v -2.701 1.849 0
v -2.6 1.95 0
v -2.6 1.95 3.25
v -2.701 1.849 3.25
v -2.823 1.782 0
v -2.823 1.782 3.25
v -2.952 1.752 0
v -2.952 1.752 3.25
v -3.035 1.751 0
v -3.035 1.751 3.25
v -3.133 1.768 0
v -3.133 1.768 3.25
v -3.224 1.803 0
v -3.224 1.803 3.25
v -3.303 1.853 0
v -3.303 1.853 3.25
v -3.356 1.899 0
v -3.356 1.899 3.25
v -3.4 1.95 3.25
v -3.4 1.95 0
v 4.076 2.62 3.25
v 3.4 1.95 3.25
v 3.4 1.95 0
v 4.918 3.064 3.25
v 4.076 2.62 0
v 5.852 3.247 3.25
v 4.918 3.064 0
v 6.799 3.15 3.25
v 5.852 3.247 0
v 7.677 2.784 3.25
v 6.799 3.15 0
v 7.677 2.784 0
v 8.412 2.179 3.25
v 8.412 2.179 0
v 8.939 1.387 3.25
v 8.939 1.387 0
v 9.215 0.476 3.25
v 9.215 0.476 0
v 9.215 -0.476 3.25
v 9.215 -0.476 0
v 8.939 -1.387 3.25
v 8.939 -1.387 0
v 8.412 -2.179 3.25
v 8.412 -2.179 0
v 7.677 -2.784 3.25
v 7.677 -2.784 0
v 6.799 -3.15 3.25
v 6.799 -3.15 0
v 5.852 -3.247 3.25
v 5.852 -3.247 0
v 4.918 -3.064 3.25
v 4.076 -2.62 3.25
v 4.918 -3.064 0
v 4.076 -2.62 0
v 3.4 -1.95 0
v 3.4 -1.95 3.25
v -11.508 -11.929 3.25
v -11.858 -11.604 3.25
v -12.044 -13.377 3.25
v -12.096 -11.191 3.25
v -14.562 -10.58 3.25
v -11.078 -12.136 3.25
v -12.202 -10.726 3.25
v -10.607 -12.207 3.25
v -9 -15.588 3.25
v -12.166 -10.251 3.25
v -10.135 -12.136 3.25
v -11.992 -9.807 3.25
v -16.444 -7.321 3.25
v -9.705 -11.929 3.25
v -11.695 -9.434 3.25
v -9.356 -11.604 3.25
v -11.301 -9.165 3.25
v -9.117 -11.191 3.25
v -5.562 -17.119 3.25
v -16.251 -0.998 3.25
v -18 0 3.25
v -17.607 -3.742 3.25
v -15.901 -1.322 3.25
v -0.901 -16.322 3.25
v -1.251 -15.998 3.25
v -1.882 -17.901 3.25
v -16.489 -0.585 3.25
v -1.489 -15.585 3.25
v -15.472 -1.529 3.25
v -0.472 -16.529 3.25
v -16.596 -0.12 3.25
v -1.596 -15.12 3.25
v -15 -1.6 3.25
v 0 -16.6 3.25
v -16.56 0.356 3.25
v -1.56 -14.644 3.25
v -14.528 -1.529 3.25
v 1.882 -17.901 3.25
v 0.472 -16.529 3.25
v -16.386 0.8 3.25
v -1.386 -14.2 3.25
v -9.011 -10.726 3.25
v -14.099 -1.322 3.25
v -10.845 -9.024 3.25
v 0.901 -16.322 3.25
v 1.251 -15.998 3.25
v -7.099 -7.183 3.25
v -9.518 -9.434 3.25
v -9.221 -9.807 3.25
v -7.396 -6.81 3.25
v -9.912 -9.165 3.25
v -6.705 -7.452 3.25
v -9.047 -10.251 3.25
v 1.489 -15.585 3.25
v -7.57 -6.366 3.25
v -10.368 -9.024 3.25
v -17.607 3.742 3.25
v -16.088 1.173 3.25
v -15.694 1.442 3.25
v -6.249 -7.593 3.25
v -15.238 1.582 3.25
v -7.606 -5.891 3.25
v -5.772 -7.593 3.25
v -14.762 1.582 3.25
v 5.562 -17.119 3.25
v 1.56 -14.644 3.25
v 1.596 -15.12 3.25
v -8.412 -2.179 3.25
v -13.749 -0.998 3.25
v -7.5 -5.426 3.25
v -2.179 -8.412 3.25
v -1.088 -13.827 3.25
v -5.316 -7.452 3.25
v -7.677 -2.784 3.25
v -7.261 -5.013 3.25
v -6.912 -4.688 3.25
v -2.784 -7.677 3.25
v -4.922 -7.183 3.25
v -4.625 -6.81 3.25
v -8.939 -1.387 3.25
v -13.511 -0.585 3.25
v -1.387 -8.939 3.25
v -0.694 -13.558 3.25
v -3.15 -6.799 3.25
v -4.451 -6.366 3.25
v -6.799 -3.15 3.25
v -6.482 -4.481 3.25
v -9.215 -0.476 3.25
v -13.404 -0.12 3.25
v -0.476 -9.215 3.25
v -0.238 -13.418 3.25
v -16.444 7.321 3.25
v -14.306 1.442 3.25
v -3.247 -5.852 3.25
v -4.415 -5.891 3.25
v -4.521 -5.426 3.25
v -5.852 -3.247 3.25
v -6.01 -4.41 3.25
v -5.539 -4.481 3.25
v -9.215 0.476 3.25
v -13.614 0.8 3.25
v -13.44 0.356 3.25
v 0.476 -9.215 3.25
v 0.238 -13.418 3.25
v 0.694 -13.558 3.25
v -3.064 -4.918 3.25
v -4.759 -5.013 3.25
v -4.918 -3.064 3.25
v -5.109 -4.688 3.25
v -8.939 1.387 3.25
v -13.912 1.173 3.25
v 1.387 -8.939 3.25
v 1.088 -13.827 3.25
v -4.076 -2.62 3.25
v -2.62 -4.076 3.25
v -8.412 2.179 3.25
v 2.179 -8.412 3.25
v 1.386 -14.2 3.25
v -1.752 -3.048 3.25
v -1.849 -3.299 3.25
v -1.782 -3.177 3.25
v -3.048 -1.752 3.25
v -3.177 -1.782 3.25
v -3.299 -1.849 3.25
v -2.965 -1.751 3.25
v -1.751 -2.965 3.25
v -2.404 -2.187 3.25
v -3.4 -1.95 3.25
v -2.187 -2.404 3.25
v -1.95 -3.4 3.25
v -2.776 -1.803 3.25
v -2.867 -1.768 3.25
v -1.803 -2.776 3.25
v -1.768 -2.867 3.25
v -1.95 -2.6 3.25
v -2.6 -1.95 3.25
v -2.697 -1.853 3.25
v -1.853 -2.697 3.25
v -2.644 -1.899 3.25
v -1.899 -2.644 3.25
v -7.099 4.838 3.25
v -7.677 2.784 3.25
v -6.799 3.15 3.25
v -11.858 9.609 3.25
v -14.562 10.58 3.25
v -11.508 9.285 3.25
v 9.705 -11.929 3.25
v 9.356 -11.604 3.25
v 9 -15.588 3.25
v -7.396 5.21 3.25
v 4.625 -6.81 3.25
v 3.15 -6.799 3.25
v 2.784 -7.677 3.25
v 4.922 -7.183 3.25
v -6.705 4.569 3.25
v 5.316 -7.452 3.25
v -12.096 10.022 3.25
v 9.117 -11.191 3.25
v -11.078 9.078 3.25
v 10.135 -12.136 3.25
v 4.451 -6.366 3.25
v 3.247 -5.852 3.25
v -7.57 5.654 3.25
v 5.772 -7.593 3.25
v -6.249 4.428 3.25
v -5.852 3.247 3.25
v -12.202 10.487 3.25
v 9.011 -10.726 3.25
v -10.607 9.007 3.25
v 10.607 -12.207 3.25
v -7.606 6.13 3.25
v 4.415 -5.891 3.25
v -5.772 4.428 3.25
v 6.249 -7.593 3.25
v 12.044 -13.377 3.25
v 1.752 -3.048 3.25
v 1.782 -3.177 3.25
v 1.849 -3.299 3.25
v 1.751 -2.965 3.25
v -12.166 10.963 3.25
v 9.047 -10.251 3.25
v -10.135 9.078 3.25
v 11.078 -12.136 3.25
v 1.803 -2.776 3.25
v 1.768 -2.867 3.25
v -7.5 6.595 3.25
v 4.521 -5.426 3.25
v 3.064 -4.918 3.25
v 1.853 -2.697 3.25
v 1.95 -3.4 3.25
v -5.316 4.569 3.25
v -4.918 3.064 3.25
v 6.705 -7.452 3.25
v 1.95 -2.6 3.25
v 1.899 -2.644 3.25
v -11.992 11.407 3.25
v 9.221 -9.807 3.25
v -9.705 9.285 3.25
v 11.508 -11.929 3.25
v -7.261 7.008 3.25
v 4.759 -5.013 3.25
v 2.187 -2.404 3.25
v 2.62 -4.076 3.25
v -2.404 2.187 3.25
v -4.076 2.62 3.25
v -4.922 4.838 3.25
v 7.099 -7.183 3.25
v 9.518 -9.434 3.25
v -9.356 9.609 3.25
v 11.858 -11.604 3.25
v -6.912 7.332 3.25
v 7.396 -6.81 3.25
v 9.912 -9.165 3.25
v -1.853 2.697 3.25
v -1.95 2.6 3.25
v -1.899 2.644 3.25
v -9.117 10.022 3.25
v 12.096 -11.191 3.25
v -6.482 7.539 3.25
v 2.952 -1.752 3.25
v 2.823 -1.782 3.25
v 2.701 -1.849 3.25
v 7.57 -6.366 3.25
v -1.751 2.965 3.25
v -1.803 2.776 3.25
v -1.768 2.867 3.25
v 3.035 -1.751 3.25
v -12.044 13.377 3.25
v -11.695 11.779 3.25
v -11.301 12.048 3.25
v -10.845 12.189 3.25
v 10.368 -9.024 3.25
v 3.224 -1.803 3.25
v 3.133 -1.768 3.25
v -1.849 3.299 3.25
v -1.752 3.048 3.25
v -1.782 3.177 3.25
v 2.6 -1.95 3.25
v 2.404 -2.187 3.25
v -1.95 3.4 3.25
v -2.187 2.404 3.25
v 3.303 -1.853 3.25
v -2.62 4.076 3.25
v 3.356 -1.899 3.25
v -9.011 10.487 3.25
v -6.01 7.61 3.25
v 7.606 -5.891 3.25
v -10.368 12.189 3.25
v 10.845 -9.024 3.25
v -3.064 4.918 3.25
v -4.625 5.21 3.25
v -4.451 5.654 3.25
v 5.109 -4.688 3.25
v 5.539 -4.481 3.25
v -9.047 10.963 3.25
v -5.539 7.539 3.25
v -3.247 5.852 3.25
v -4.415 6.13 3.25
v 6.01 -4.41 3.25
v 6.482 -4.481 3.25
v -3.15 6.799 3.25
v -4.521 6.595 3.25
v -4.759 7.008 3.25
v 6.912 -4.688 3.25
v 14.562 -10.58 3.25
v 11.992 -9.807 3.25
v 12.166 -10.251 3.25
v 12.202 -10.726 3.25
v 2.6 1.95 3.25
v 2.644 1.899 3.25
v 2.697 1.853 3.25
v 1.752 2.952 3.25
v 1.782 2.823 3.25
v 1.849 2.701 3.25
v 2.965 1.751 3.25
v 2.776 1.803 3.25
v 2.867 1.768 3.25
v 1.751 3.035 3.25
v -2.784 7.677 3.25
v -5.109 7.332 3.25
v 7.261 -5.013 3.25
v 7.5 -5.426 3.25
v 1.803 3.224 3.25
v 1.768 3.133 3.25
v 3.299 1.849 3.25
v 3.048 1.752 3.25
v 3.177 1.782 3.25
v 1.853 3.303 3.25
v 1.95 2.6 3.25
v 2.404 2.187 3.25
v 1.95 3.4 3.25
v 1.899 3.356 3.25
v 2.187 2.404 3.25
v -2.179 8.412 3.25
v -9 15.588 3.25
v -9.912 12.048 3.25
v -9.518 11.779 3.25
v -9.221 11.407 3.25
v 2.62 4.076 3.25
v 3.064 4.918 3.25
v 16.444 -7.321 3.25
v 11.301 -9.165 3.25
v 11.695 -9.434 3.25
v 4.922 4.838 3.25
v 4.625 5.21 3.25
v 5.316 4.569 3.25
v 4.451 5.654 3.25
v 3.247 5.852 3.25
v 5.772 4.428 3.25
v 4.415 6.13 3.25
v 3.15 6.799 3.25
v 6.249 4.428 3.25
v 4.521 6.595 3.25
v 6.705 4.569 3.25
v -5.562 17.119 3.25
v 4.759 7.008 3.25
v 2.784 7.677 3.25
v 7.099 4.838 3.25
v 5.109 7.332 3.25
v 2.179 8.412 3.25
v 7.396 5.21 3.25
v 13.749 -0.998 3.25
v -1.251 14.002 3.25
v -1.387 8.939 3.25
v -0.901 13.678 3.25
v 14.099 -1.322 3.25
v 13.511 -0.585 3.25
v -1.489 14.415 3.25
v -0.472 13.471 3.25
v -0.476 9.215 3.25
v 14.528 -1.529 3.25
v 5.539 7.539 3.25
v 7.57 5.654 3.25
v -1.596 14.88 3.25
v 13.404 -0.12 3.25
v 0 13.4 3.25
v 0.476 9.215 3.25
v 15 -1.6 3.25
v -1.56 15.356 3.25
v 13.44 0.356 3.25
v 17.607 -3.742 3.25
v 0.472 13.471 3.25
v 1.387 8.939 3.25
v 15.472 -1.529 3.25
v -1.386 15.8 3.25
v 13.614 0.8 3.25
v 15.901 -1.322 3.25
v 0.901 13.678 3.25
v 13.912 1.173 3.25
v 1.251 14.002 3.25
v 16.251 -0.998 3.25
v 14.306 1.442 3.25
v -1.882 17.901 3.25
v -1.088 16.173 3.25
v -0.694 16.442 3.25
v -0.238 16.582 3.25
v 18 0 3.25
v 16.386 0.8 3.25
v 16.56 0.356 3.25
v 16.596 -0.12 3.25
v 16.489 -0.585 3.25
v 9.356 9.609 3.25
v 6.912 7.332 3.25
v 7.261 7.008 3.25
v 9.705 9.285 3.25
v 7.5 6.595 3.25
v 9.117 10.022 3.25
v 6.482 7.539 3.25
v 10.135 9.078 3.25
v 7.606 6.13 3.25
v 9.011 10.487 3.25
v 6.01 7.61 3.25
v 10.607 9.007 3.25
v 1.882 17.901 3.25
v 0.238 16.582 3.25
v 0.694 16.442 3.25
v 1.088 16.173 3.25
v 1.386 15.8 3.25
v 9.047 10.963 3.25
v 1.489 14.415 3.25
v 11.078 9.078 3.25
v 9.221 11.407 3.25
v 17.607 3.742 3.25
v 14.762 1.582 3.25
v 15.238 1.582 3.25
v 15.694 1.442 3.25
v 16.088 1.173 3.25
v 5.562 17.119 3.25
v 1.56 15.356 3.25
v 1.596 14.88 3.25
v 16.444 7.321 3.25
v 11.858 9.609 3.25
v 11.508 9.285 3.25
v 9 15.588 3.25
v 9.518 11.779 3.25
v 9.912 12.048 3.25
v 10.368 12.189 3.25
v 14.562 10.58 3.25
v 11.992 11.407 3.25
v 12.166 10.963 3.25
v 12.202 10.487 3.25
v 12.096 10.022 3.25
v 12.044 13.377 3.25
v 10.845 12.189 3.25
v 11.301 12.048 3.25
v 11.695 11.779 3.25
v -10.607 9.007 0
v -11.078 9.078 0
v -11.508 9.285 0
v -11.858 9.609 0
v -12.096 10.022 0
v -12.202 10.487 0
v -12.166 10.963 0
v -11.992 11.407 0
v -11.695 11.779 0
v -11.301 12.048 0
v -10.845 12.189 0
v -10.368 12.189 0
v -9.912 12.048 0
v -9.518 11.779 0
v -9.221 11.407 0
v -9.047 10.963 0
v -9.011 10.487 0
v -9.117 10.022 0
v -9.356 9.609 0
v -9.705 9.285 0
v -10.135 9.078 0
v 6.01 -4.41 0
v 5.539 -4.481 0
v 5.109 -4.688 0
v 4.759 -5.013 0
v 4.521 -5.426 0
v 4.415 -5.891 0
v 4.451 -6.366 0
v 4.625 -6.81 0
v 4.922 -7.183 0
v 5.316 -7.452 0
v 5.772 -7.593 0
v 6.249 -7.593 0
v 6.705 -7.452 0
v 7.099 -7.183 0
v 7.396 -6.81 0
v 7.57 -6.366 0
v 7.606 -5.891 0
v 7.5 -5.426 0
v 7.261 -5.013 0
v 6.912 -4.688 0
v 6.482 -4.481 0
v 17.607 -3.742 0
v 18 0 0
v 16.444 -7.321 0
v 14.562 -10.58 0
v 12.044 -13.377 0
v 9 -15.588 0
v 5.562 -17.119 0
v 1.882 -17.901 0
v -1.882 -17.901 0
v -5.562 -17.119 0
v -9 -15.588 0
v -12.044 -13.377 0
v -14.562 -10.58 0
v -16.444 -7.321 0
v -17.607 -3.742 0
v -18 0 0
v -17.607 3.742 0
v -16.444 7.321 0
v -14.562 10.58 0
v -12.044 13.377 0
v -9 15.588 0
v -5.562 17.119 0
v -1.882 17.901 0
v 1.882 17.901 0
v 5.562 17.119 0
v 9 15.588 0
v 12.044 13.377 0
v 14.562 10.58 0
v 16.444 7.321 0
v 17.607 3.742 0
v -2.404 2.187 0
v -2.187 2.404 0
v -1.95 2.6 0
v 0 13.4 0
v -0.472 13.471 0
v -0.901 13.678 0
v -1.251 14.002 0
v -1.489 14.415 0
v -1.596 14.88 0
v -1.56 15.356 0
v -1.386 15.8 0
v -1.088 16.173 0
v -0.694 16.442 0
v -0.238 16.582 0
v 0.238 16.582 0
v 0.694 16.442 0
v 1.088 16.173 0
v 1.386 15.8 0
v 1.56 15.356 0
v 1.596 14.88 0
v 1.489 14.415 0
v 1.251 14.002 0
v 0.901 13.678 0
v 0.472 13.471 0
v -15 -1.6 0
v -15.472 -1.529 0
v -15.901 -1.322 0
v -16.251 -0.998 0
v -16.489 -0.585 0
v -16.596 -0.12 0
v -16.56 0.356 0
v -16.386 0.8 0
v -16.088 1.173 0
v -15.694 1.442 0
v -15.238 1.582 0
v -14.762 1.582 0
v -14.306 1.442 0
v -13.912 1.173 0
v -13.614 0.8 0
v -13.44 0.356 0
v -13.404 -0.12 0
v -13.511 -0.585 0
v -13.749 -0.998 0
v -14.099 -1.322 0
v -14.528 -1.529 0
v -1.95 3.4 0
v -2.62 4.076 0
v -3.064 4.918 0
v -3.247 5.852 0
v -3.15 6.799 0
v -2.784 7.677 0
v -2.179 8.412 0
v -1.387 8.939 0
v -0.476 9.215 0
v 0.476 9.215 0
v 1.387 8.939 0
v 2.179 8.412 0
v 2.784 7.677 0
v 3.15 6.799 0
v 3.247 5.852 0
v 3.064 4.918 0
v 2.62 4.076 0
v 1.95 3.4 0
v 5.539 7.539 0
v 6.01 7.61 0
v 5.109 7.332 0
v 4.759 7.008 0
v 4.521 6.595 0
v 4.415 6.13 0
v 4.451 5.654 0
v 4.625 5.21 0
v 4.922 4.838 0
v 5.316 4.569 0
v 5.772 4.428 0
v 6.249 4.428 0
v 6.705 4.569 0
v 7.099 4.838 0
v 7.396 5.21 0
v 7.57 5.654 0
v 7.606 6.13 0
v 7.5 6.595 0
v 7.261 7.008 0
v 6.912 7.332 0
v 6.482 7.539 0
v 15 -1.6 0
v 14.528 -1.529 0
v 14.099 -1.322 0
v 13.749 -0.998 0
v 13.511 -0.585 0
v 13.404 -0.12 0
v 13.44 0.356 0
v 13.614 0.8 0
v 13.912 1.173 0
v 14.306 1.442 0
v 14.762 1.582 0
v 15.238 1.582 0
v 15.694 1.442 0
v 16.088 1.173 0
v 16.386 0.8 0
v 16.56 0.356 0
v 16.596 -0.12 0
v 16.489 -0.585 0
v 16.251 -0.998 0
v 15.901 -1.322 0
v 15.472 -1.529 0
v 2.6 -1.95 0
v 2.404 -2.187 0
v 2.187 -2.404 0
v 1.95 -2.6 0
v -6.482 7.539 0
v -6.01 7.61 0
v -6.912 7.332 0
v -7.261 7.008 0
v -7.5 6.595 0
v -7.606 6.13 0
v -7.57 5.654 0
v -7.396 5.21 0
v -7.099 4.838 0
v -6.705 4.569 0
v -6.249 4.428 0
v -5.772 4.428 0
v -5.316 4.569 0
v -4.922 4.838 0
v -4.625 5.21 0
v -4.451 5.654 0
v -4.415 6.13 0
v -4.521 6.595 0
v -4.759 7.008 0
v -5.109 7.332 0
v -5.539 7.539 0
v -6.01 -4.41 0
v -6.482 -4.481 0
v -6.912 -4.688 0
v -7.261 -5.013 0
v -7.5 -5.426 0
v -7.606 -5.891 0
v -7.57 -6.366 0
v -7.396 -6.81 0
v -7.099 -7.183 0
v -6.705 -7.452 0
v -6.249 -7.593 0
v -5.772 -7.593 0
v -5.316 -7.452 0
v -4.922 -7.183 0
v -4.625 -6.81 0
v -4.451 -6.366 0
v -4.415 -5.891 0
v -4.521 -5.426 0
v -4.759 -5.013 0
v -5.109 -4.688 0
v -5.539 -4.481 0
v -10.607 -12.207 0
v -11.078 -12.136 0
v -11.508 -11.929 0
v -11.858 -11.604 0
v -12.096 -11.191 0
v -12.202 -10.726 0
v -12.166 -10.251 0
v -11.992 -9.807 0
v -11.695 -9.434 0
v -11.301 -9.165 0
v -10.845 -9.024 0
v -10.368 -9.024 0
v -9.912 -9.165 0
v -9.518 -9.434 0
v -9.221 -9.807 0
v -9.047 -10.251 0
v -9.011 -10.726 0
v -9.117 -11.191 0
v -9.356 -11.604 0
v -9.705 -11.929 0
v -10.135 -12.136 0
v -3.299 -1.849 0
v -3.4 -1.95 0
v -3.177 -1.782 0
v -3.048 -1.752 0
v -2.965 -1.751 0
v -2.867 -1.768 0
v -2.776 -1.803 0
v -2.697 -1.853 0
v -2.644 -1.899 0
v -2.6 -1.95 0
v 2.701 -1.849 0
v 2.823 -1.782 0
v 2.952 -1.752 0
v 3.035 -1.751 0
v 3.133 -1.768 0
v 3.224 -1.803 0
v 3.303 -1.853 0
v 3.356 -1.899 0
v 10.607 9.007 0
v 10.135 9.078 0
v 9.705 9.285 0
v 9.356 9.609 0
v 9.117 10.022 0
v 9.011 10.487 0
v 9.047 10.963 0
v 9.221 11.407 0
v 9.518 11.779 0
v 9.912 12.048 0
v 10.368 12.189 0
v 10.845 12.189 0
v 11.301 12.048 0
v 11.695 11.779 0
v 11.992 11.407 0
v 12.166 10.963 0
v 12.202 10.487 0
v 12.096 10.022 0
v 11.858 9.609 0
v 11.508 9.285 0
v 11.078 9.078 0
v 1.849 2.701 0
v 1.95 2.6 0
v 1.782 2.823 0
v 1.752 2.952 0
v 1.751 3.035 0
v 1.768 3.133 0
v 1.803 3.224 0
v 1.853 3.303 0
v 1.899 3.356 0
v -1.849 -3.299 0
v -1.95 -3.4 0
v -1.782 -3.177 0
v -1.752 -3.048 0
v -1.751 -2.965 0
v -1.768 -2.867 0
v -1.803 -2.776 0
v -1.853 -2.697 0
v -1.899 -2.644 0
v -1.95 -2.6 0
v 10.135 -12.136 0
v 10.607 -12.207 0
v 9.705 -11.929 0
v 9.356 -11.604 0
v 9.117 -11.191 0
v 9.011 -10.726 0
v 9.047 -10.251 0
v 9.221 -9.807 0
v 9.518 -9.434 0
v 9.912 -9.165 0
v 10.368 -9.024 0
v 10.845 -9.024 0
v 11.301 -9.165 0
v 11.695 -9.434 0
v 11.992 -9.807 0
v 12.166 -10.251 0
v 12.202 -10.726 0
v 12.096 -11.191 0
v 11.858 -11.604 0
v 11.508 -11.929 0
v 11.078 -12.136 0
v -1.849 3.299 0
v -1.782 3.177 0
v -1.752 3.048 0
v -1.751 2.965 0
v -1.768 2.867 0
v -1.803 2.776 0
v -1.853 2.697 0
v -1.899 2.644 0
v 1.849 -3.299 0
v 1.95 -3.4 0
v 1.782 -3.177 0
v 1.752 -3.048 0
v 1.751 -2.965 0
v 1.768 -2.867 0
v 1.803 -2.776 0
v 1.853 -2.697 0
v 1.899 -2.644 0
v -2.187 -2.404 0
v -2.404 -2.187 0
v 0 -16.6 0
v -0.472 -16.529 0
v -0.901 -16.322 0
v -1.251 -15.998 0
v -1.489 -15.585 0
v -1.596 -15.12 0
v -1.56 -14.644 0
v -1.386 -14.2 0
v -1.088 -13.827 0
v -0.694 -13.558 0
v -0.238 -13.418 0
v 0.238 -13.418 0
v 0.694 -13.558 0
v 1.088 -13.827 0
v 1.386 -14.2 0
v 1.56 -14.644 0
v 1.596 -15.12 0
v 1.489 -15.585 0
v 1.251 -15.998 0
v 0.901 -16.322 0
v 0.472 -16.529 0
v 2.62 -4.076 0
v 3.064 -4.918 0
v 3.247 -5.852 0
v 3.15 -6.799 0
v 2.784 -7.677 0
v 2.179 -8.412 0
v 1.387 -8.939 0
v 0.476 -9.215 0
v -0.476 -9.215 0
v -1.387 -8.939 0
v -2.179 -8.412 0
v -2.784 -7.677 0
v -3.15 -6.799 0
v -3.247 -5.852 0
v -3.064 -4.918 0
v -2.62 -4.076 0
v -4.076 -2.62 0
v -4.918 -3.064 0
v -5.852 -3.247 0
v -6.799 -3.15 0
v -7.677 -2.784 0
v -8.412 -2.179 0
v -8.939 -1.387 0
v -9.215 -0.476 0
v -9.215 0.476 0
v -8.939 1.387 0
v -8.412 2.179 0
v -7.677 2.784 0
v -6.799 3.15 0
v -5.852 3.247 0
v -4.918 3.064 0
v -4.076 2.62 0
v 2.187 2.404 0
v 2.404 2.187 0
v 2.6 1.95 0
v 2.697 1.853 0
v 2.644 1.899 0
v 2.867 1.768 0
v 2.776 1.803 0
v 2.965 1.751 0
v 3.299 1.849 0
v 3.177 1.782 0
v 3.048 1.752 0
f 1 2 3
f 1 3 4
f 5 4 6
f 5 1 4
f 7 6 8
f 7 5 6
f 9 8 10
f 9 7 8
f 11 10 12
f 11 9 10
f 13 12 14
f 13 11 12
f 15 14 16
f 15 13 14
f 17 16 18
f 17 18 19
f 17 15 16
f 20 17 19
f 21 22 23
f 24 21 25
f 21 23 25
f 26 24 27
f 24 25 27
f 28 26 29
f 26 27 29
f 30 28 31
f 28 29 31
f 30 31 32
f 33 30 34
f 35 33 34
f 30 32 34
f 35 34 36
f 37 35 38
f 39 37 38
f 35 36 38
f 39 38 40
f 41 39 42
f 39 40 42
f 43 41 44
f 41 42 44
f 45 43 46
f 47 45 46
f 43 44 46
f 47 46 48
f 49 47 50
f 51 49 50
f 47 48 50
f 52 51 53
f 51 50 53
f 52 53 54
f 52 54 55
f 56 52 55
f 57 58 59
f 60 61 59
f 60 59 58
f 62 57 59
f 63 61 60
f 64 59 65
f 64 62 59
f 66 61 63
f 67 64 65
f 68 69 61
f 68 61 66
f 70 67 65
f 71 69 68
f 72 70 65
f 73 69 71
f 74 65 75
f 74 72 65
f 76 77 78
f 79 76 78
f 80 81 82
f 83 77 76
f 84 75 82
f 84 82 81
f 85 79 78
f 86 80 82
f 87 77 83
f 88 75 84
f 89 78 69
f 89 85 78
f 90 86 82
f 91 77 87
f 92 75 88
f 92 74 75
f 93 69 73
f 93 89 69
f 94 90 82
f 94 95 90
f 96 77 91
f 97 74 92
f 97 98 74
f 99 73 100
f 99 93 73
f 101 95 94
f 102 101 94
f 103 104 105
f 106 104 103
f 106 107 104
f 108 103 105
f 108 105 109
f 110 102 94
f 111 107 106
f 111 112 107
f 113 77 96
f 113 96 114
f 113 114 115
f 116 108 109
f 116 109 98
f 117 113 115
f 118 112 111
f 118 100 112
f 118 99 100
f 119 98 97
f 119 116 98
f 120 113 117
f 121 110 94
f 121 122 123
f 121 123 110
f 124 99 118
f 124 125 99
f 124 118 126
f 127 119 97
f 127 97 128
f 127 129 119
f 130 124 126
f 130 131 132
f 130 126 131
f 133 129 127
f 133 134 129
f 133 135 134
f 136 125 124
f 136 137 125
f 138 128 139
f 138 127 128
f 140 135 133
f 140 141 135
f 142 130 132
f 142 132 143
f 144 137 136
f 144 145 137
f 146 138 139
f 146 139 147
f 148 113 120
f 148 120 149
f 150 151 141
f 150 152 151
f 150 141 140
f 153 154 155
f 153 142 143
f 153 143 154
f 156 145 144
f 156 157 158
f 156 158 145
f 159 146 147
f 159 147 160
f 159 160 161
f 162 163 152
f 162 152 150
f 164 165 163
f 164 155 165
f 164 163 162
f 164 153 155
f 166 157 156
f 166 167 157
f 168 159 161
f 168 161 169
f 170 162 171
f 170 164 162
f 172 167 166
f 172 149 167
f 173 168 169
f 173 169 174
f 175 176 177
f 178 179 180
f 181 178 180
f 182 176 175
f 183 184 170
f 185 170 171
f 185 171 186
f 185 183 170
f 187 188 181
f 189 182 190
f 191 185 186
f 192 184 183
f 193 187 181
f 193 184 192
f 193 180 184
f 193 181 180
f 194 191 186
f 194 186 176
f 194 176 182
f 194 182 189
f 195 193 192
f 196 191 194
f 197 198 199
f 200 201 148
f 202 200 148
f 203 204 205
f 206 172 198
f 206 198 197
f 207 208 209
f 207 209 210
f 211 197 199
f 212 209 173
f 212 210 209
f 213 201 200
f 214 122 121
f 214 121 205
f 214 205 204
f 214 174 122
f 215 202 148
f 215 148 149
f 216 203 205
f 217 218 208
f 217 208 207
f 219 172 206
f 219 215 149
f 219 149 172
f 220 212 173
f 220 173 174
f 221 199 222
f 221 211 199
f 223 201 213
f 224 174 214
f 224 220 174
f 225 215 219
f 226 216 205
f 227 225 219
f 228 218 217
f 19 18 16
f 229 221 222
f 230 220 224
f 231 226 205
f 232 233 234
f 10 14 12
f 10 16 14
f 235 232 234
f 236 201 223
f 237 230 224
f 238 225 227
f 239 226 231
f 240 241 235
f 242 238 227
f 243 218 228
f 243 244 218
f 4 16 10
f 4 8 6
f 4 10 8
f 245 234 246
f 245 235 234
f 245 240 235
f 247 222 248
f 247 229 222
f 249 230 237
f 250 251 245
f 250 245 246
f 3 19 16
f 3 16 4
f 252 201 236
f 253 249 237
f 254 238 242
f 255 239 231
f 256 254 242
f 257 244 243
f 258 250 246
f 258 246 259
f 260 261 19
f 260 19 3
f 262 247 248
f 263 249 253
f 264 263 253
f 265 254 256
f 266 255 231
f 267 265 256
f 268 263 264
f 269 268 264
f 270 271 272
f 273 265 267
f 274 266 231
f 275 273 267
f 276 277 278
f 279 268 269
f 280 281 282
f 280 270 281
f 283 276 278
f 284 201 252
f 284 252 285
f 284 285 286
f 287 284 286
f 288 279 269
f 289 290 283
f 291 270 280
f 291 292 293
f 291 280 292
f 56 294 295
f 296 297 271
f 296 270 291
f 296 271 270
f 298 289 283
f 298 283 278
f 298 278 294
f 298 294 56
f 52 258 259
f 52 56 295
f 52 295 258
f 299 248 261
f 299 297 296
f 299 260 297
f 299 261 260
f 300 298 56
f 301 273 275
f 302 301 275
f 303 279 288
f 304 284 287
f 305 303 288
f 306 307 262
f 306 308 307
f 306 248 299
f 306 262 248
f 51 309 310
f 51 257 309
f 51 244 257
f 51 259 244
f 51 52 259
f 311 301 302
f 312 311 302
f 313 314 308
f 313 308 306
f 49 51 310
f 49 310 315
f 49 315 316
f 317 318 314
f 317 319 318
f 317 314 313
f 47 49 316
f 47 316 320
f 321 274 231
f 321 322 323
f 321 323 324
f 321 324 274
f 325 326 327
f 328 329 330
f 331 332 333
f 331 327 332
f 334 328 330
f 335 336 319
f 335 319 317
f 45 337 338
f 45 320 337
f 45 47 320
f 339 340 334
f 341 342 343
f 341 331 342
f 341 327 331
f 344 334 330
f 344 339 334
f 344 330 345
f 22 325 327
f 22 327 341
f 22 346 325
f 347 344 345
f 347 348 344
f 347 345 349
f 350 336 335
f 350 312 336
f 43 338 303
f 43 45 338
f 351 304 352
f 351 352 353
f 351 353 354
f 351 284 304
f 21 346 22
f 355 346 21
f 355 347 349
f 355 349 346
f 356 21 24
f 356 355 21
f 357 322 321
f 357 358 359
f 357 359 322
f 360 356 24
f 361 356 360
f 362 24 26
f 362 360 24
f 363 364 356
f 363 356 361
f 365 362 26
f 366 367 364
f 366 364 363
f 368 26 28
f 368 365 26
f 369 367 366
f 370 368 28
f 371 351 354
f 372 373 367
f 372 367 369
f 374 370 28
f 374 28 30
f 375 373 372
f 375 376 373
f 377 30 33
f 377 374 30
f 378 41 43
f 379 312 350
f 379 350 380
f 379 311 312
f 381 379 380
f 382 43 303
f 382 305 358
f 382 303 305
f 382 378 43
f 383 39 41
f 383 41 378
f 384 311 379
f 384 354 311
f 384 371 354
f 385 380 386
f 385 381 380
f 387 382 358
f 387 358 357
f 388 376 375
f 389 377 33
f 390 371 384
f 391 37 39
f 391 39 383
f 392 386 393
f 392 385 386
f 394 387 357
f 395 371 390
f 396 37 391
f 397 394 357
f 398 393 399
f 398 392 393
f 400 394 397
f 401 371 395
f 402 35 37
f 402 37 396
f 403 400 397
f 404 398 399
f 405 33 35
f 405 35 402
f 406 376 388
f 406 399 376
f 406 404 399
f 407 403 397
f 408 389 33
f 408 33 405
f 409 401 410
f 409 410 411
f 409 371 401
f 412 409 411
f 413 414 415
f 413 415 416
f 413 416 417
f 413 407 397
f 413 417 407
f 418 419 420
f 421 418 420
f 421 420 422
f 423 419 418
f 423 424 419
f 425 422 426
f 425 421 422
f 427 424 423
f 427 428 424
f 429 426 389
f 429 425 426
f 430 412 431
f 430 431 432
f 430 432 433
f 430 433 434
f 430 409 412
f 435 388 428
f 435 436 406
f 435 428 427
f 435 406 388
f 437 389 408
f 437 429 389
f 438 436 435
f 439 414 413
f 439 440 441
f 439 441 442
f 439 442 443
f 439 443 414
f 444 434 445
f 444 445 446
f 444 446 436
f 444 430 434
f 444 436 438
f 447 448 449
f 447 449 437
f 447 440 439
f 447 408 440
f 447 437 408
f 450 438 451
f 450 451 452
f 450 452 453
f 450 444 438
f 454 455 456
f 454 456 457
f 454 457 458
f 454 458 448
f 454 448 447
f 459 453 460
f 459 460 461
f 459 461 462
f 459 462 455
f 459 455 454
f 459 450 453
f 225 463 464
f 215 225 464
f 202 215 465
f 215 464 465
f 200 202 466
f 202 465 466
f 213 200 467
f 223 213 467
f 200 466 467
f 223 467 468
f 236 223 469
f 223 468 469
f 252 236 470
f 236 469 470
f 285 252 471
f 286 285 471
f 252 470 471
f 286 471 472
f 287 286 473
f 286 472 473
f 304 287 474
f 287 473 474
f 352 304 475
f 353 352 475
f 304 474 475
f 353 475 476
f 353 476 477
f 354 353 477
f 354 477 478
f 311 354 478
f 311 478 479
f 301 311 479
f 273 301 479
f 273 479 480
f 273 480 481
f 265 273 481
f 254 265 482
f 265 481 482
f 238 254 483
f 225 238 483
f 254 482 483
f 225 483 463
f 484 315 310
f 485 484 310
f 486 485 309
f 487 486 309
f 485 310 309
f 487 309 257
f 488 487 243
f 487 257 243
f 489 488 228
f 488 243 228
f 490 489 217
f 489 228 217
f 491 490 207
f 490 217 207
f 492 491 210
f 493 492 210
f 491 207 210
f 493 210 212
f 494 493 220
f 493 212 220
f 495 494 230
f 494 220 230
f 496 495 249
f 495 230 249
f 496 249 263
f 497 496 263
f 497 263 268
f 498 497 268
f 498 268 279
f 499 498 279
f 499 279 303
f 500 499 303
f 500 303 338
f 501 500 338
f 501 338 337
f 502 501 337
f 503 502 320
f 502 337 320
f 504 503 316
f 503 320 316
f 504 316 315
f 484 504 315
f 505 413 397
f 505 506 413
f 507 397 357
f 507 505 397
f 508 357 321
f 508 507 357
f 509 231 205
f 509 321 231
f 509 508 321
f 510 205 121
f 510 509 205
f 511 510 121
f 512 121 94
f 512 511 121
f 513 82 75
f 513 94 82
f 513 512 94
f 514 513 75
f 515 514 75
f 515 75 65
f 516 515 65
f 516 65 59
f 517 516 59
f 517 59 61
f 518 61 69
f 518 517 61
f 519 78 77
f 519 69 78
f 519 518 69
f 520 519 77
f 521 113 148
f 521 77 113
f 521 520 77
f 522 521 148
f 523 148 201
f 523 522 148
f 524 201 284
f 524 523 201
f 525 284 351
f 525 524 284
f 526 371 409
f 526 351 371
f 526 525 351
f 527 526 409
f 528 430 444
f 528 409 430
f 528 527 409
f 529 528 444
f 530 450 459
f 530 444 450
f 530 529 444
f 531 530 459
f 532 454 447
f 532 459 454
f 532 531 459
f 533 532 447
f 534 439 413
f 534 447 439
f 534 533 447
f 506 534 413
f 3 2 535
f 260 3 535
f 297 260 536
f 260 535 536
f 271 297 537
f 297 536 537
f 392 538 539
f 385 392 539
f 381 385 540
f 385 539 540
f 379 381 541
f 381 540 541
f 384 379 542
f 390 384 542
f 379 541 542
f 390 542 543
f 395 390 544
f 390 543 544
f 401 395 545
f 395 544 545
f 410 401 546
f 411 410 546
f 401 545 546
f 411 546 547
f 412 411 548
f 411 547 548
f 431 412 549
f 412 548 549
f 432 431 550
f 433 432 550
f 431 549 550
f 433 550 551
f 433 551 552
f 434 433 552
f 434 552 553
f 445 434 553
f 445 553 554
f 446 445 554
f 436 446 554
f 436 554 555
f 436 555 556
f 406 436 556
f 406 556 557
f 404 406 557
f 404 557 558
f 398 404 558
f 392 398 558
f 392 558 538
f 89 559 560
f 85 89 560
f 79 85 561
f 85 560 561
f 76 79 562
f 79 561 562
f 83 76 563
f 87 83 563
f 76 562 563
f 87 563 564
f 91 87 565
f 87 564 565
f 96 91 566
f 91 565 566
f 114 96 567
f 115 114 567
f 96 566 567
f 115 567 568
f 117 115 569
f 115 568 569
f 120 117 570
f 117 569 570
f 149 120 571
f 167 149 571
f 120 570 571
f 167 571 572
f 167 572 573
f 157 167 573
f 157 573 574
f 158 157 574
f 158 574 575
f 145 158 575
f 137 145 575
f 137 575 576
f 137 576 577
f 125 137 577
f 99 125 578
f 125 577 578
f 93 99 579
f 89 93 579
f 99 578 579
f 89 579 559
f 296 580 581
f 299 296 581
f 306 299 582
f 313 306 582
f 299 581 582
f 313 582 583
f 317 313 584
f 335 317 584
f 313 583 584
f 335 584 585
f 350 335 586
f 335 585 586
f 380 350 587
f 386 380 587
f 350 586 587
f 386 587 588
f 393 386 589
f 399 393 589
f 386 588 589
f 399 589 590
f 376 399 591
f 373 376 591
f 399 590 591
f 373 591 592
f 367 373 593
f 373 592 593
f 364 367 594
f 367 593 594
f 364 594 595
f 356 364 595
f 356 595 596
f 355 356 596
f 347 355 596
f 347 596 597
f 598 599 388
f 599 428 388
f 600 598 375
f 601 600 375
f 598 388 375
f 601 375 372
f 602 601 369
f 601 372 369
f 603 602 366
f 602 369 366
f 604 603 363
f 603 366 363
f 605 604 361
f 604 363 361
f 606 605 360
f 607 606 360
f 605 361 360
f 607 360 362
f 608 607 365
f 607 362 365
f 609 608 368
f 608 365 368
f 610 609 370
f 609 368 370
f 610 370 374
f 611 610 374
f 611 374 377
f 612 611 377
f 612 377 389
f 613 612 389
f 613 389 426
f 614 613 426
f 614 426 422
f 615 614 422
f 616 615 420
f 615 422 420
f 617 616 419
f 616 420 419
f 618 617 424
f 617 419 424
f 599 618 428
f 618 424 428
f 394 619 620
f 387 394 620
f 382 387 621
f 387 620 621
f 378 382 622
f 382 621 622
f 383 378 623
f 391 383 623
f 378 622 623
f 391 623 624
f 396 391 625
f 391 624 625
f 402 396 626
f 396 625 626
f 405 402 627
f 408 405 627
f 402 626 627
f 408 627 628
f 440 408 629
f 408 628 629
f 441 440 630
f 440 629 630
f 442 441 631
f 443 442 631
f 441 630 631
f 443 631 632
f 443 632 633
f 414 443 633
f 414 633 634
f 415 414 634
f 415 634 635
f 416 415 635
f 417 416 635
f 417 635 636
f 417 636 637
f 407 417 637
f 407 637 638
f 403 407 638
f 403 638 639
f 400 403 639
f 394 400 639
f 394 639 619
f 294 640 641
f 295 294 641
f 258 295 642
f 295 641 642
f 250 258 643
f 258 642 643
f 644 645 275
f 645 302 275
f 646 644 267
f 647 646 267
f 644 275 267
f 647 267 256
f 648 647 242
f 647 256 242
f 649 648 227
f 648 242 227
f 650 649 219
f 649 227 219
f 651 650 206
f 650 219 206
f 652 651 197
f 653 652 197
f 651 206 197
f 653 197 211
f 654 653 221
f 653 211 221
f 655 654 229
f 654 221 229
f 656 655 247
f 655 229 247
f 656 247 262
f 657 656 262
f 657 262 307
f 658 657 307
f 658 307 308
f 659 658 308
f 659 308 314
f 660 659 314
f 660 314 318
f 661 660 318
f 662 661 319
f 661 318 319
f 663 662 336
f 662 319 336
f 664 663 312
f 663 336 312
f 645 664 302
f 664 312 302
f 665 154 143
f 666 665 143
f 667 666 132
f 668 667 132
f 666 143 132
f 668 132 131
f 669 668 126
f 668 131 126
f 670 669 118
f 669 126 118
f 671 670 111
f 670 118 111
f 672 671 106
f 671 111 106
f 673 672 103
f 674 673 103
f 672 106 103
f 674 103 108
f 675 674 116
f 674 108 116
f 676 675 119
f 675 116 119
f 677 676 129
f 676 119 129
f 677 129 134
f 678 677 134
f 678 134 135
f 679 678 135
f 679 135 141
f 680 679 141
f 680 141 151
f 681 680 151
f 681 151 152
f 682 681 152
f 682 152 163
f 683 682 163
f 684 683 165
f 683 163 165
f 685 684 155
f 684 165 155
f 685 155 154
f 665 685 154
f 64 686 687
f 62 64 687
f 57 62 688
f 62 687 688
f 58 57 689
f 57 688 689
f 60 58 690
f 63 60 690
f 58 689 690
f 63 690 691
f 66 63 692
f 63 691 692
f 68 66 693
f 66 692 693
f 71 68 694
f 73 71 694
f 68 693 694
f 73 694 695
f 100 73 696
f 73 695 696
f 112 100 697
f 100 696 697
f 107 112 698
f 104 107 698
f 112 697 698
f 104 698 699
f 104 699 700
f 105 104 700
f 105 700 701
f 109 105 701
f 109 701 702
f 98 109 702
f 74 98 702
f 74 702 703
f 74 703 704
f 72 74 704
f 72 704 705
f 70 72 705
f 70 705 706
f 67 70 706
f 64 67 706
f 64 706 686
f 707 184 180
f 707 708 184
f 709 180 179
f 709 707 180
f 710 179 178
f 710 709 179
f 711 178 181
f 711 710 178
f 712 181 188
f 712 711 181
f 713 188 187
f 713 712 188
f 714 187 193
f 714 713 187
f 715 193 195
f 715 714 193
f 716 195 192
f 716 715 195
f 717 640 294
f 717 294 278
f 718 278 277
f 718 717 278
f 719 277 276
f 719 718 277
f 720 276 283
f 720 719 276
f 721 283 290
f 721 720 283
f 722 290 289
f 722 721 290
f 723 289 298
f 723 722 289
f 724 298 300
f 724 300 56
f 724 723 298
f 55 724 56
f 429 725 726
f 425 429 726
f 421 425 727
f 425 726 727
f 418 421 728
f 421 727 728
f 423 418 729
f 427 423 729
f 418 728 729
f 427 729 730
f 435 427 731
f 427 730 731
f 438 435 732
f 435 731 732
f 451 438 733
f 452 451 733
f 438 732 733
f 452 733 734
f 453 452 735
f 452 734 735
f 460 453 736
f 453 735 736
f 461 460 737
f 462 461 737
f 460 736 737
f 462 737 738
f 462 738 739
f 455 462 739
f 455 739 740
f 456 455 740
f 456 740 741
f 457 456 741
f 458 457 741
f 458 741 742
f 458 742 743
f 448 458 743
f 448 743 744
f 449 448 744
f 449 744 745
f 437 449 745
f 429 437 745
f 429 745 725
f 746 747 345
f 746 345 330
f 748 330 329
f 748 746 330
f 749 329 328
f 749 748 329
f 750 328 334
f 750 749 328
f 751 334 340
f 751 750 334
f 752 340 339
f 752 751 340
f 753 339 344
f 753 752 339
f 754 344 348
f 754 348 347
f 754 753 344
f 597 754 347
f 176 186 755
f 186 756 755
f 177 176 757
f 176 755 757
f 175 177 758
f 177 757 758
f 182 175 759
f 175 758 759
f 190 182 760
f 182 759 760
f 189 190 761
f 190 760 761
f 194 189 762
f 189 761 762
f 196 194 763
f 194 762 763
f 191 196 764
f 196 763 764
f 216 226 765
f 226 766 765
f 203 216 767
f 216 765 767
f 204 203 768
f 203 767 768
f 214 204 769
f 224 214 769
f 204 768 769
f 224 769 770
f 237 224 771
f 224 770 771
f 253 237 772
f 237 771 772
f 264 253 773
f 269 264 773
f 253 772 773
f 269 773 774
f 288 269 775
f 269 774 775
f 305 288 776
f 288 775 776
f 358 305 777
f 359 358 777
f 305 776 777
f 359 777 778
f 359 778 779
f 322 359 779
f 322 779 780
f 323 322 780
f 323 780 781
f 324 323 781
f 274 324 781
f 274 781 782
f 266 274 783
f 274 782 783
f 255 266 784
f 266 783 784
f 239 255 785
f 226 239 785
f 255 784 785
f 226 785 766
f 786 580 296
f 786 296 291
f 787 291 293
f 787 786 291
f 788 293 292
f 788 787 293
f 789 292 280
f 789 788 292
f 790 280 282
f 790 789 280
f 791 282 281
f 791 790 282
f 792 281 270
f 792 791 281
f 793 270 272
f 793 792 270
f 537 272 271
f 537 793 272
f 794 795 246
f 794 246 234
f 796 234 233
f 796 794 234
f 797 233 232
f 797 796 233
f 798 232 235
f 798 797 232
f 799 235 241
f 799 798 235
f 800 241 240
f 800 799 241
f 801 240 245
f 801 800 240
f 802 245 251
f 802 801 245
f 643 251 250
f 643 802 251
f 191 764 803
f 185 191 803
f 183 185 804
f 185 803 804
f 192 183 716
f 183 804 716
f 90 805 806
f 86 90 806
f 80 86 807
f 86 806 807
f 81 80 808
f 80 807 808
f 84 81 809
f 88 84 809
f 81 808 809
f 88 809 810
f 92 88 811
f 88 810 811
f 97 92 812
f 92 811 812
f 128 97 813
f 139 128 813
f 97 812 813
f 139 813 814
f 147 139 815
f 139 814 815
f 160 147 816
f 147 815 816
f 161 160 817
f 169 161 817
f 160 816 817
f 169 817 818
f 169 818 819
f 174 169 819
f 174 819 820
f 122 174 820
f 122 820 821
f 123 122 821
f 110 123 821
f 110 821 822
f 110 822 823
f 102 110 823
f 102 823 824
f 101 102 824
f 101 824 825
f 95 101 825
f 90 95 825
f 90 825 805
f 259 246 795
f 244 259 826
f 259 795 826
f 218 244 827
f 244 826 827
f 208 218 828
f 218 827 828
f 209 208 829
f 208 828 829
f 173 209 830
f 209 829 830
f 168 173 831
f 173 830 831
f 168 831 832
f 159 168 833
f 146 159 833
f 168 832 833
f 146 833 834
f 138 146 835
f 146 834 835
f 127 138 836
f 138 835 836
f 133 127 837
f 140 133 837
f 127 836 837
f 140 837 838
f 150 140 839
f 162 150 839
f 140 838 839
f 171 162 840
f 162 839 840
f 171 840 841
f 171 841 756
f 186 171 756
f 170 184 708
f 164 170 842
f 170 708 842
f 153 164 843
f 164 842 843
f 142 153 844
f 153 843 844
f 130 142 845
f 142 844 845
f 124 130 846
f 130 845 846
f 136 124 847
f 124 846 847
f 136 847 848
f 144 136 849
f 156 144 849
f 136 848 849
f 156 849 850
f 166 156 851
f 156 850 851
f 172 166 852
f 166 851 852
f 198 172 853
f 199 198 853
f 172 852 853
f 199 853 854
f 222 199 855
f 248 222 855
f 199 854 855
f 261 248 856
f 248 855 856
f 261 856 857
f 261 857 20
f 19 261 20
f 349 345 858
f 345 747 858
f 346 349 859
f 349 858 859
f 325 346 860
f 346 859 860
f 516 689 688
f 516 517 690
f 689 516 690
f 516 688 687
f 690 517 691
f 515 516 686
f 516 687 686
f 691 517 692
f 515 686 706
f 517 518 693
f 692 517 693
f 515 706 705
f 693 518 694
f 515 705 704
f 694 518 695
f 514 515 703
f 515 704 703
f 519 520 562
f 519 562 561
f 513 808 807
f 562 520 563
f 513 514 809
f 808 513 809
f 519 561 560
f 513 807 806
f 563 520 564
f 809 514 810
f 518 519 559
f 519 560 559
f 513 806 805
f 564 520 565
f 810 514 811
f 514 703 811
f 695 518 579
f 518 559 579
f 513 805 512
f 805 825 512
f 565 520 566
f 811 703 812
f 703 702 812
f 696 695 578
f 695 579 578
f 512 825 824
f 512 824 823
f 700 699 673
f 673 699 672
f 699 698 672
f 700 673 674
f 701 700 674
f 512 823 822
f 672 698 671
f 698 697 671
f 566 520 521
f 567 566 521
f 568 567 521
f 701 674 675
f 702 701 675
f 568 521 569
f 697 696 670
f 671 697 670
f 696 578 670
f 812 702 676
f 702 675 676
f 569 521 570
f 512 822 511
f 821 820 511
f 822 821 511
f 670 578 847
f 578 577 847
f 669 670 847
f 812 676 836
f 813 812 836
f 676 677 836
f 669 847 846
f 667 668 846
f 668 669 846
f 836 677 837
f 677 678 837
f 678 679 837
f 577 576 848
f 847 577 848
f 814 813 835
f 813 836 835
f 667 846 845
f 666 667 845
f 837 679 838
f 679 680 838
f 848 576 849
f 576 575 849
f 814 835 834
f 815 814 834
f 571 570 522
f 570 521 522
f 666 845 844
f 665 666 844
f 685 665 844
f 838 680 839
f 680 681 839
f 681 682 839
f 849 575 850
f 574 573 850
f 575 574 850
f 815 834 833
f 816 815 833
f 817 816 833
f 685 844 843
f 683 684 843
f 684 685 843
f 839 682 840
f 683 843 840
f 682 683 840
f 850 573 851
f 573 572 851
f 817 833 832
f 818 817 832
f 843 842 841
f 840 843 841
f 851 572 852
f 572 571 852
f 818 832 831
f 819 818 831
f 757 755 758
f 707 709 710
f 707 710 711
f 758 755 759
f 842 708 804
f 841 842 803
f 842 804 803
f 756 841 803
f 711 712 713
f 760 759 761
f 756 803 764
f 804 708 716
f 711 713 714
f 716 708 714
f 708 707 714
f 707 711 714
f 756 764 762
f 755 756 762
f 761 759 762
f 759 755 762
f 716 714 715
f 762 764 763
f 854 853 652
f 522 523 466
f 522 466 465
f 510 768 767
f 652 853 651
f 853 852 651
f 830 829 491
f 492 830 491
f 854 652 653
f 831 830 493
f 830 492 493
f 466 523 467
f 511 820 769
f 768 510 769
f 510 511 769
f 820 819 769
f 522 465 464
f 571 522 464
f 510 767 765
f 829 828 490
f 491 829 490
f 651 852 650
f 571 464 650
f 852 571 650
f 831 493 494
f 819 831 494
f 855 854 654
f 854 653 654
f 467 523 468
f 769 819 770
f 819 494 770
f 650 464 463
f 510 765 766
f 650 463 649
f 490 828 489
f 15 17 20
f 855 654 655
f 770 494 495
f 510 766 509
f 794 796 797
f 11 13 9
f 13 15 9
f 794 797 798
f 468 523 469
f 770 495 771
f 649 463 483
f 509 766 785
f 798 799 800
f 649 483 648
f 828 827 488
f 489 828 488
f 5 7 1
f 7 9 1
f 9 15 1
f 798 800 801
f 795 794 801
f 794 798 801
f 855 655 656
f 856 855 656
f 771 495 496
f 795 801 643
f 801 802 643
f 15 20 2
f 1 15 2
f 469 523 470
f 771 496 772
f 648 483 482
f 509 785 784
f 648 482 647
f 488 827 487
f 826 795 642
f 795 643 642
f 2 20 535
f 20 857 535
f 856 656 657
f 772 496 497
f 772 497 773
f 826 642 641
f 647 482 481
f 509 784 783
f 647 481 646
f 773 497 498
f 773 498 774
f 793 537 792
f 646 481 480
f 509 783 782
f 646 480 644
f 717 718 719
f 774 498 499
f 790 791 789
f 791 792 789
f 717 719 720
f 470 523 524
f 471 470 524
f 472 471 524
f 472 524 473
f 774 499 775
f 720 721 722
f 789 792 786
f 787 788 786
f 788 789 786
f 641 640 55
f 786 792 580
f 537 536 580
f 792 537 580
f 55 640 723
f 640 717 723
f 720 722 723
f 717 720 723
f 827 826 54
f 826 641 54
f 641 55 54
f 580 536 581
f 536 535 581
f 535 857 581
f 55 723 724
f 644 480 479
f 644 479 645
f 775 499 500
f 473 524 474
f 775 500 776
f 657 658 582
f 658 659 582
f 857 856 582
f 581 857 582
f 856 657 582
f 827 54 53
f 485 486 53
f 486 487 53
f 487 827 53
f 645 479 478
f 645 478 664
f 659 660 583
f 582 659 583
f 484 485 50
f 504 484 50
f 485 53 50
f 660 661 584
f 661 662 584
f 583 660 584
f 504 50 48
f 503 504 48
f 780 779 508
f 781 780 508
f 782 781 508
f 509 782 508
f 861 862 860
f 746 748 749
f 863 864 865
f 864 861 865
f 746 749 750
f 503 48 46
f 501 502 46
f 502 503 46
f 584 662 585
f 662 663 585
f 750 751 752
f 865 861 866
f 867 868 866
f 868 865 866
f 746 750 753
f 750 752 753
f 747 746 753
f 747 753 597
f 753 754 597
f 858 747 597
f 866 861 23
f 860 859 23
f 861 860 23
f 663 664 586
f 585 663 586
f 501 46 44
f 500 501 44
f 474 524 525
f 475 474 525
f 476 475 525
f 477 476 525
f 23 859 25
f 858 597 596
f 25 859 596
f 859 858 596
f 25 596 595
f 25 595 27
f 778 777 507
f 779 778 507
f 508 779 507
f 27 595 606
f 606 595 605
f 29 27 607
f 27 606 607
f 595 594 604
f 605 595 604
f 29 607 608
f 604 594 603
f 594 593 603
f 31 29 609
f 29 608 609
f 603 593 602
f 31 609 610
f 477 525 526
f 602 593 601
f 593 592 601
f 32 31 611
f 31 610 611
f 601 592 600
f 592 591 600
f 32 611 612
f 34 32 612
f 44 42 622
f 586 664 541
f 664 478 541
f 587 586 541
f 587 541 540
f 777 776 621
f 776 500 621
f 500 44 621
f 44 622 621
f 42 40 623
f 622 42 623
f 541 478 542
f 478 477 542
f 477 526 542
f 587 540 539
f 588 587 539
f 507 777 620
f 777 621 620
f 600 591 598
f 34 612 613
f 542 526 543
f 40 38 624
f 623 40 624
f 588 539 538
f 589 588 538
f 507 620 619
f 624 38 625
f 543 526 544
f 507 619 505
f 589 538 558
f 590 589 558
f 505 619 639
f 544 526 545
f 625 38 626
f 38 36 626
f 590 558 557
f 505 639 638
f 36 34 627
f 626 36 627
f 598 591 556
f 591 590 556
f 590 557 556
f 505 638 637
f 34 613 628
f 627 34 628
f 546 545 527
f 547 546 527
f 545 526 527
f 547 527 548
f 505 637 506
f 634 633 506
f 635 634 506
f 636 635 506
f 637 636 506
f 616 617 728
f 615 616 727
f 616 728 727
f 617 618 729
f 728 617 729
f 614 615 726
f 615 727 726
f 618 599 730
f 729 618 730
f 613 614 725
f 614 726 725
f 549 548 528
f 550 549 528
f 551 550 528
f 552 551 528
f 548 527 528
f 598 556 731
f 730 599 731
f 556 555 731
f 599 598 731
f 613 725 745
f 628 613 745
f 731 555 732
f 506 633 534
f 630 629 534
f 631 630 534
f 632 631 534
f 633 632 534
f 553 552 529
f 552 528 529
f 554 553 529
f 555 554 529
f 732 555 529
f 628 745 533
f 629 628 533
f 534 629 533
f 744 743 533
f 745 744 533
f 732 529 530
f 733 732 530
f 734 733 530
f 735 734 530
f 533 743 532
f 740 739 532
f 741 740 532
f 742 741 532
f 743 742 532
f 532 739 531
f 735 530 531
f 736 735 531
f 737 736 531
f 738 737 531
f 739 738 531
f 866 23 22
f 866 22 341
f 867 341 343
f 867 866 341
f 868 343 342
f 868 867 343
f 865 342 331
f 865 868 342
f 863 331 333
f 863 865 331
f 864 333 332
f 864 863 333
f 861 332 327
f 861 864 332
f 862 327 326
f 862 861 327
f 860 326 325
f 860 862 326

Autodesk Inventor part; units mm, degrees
ref_plane "YZ Plane" through (0, 0, 0) normal (1, 0, 0) x (0, 1, 0)
ref_plane "XZ Plane" through (0, 0, 0) normal (0, 1, 0) x (-1, 0, 0)
ref_plane "XY Plane" through (0, 0, 0) normal (0, 0, 1) x (1, 0, 0)
sketch "スケッチ1" plane through (0, 0, 0) normal (0, 0, 1) x (1, 0, 0)
  circle A0 centre (0, 0) radius 18
  dimension "d0" = 36
extrude "押し出し1" add sketch "スケッチ1" along normal blind 3.25
sketch "スケッチ2" plane through (0, 0, 3.25) normal (0, 0, 1) x (1, 0, 0)
  circle A0 centre (0, 0) radius 6
  point P0 (0, 6)
  point P1 (-6, 0)
  point P2 (0, -6)
  point P3 (6, 0)
  dimension "d3" = 12
  dimension "d6" = 360
hole "穴1" at (0, 6, 3.25) at (-6, 0, 3.25) at (0, -6, 3.25) at (6, 0, 3.25) direction (0, 0, -1) diameter 3.2 end through all counterbore diameter 6.5 counterbore depth 4 clearance for "Socket Head Cap Screw" size "M3" standard "Ansi Metric M Profile"
sketch "スケッチ3" plane through (0, 0, 0) normal (0, 0, -1) x (-1, 0, 0)
  circle A0 centre (0, 0) radius 8.5
  point P0 (-6.0104, 6.0104)
  point P1 (-6.0104, -6.0104)
  point P2 (6.0104, -6.0104)
  point P3 (6.0104, 6.0104)
  dimension "d15" = 17
  dimension "d18" = 360
hole "穴2" at (6.0104, 6.0104, 0) at (6.0104, -6.0104, 0) at (-6.0104, -6.0104, 0) at (-6.0104, 6.0104, 0) direction (0, 0, 1) diameter 3.2 end through all clearance for "Socket Head Cap Screw" size "M3" standard "Ansi Metric M Profile"
sketch "スケッチ4" plane through (0, 0, 0) normal (0, 0, -1) x (-1, 0, 0)
  circle A0 centre (0, 0) radius 3.25
  dimension "d27" = 6.5
extrude "押し出し2" cut sketch "スケッチ4" against normal blind 8
fillet "フィレット1" radius 0.5 8 edges at (-1.25, -3, 1.625) (1.25, -3, 1.625) (3, -1.25, 1.625) (3, 1.25, 1.625) (1.25, 3, 1.625) (-1.25, 3, 1.625) (-3, 1.25, 1.625) (-3, -1.25, 1.625)
sketch "スケッチ5" plane through (0, 0, 3.25) normal (0, 0, 1) x (1, 0, 0)
  circle A0 centre (0, 0) radius 15
  point P0 (0, -15)
  point P1 (10.6066, -10.6066)
  point P2 (15, 0)
  point P3 (10.6066, 10.6066)
  point P4 (0, 15)
  point P5 (-10.6066, 10.6066)
  point P6 (-15, 0)
  point P7 (-10.6066, -10.6066)
  dimension "d31" = 30
  dimension "d34" = 360
hole "穴3" at (0, -15, 3.25) at (10.6066, -10.6066, 3.25) at (15, 0, 3.25) at (10.6066, 10.6066, 3.25) at (0, 15, 3.25) at (-10.6066, 10.6066, 3.25) at (-15, 0, 3.25) at (-10.6066, -10.6066, 3.25) direction (0, 0, -1) diameter 3.2 end through all clearance for "Socket Head Cap Screw" size "M3" standard "Ansi Metric M Profile"
properties part number "s_base5"
